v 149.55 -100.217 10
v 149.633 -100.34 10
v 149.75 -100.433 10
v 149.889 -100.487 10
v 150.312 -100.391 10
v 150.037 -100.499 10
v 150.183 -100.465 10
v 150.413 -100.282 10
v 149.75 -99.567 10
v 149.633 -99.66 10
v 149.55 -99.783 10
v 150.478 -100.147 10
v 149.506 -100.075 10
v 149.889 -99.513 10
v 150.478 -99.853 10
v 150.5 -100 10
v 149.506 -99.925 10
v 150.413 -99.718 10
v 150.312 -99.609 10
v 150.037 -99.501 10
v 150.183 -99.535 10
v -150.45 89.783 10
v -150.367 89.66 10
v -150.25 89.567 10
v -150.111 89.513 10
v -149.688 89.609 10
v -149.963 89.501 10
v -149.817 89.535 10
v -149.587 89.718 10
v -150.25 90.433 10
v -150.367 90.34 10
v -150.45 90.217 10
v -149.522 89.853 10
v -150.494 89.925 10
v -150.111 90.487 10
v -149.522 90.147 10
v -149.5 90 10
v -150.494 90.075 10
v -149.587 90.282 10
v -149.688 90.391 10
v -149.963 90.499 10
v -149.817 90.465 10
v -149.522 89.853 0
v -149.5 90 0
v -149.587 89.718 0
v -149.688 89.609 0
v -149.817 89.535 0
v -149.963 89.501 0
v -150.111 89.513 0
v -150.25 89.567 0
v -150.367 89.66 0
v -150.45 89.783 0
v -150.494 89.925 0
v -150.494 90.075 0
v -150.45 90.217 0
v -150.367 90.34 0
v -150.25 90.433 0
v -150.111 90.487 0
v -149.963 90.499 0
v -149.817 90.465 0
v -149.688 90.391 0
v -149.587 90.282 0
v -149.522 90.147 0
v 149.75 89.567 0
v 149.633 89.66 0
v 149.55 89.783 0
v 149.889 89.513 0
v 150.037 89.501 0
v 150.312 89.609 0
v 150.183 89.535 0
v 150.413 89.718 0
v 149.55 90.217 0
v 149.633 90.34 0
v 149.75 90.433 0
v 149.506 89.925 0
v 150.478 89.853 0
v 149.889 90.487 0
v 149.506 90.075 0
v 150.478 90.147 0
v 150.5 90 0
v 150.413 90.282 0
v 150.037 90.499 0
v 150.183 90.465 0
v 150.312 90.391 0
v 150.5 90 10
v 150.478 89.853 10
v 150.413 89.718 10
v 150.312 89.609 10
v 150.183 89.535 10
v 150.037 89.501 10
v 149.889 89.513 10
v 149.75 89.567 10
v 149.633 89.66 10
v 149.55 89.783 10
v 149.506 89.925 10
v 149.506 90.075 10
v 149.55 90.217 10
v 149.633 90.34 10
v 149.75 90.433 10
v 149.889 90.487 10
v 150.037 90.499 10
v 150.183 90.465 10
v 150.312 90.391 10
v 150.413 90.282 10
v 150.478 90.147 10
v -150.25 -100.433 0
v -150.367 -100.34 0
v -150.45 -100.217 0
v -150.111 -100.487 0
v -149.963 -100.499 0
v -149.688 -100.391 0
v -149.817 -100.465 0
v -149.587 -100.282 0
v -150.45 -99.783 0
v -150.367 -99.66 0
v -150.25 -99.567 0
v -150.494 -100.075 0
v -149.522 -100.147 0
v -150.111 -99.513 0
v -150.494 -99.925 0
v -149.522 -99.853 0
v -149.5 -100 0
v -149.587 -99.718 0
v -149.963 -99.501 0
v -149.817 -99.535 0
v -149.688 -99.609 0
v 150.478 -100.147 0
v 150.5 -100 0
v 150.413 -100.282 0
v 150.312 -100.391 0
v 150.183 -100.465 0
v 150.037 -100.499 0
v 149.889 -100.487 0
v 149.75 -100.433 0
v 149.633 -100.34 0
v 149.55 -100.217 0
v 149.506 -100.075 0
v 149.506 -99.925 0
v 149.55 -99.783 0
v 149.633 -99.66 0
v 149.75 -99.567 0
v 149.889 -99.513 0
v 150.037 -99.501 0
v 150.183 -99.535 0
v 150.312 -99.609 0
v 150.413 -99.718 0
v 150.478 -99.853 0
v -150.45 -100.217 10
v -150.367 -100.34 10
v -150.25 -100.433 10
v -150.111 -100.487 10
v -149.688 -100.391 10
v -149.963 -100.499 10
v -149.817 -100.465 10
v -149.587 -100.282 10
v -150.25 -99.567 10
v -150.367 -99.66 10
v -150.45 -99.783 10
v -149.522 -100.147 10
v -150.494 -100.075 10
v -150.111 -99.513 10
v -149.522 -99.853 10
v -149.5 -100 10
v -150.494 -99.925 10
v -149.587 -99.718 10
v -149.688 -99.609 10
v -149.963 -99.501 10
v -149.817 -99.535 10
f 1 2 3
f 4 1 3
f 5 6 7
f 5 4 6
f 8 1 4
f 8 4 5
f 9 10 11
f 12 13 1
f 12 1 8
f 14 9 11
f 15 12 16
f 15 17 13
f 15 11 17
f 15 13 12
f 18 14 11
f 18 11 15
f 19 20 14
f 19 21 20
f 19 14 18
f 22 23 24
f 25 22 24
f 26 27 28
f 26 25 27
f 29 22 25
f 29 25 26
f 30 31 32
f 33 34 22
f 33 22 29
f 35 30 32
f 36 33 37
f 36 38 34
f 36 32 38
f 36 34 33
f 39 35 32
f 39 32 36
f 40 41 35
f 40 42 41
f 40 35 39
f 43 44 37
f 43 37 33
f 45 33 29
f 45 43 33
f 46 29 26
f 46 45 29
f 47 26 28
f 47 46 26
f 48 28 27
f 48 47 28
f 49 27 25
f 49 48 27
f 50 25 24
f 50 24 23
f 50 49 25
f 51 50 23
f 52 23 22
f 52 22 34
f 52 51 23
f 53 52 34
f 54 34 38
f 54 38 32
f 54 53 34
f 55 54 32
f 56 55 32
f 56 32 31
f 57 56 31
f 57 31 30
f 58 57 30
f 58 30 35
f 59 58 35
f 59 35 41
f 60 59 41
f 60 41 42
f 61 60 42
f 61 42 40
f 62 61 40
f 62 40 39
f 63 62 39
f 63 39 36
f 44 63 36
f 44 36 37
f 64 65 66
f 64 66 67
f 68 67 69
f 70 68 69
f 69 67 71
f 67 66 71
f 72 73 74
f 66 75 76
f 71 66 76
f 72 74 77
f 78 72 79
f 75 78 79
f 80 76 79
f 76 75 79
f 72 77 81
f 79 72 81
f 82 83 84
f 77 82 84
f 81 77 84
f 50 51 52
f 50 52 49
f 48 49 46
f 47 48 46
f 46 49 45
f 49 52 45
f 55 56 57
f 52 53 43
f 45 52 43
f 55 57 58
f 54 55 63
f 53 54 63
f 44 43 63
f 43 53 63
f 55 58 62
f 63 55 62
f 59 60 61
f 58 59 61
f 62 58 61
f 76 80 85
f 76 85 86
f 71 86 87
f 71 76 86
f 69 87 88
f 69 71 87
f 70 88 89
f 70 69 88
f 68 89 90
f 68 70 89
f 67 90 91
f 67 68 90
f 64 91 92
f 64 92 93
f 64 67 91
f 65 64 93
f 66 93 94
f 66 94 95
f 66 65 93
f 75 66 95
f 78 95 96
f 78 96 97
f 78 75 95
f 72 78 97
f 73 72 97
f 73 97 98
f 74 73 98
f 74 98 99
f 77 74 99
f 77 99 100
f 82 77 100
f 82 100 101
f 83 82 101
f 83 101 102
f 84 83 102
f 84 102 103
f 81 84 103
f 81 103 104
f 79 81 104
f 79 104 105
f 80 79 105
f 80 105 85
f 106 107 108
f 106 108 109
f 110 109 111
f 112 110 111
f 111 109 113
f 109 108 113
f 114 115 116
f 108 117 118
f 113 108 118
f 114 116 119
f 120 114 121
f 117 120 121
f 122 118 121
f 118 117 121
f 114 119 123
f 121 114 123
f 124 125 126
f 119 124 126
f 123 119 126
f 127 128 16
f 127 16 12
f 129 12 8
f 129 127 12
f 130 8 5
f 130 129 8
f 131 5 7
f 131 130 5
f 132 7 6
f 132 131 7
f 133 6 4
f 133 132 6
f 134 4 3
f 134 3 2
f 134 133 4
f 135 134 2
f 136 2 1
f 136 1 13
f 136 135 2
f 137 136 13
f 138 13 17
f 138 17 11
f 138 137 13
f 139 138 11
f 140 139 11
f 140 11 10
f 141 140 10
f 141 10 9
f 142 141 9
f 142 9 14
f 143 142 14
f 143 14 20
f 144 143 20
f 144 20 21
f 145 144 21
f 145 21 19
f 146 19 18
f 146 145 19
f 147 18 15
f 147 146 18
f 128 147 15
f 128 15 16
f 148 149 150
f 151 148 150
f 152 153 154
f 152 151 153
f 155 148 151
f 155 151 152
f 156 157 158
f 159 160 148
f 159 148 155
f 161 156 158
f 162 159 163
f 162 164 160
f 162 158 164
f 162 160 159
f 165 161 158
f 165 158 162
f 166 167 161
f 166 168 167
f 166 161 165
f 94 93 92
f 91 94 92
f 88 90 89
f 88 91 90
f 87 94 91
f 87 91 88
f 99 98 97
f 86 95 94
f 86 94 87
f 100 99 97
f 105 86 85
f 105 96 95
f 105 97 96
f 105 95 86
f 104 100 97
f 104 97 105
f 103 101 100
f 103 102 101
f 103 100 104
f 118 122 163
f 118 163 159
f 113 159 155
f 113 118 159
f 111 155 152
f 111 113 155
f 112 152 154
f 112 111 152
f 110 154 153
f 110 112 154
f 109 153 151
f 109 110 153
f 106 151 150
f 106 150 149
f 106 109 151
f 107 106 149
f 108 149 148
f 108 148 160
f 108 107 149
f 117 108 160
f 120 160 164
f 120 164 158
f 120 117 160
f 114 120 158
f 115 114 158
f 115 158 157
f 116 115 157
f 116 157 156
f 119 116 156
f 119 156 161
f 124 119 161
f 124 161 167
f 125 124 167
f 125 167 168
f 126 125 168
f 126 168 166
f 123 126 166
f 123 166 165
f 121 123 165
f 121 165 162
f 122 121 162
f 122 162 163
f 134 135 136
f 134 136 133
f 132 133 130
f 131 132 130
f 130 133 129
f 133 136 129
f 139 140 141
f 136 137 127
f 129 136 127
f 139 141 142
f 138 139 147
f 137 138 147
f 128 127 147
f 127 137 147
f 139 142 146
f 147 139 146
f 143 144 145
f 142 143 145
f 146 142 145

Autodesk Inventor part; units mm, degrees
ref_plane "YZ Plane" through (0, 0, 0) normal (1, 0, 0) x (0, 1, 0)
ref_plane "XZ Plane" through (0, 0, 0) normal (0, 1, 0) x (-1, 0, 0)
ref_plane "XY Plane" through (0, 0, 0) normal (0, 0, 1) x (1, 0, 0)
sketch "Sketch1" plane through (0, 0, 0) normal (0, 0, 1) x (1, 0, 0)
  line L0 (-200, -150) -> (200, -150)
  line L1 (200, -150) -> (200, 150)
  line L2 (200, 150) -> (-200, 150)
  line L3 (-200, 150) -> (-200, -150)
  line L4 (-200, -150) -> (200, 150) construction
  line L5 (200, -150) -> (-200, 150) construction
  line L6 (-150, -100) -> (150, -100)
  line L7 (150, -100) -> (150, 90)
  line L8 (150, 90) -> (-150, 90)
  line L9 (-150, 90) -> (-150, -100)
  line L10 (-150, -100) -> (150, 90) construction
  line L11 (150, -100) -> (-150, 90) construction
  circle A0 centre (-150, -100) radius 0.5
  circle A1 centre (-150, 90) radius 0.5
  point P0 (0, 0)
  point P1 (0, -5)
  point P2 (0, -5)
  point P3 (0, -5)
  dimension "Length" = 400
  dimension "Width" = 300
  dimension "d3" = 145
  dimension "d4" = 300
  dimension "d5" = 190
  dimension "d7" = 200
  dimension "d8" = 1
  dimension "d9" = 1
extrude "Extrusion1" add sketch "Sketch1" along normal blind 10 contours L9 A0 L6 | L6 A0 L9
extrude "Extrusion2" add sketch "Sketch1" along normal blind 10 separate body contours A1 L8 L9 | L9 L8 A1
pattern_linear "Rectangular Pattern2" count 2 spacing 300 along (1, 0, 0) of "Extrusion2" bodies 2
pattern_linear "Rectangular Pattern1" count 2 spacing 300 along (1, 0, 0) bodies 1
equation "\"d3\" = Y_Coord"
equation "\"d4\" = LX"
equation "\"d5\" = LY"
equation "\"d7\" = X_Coord"
equation "\"d19\" = LX"
equation "\"X_Coord\" = 0.5 * Length + 0.5 * Shift_X"
equation "\"Y_Coord\" = 0.5 * Width + 0.5 * Shift_Y"
equation "\"Shift_X\" = 0"
equation "\"LX\" = -2 * Margins_X + Length - Shift_X"
equation "\"LY\" = 190"
equation "\"Shift_Y\" = -10"
equation "\"Margins_X\" = 50"
properties part number "Legs"
